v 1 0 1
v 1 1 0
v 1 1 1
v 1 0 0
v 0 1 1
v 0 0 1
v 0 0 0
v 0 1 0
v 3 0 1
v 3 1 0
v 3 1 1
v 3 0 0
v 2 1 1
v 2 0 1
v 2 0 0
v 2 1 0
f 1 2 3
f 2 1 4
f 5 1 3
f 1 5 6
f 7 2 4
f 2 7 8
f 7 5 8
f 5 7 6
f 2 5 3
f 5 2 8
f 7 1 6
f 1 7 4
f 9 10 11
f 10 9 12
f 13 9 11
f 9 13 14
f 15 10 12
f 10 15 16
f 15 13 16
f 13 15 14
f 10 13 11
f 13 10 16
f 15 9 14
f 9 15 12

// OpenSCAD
//type of the payload
shape = "cube";//[cube,sphere,torus]
//quantity of the payloads
quantity = 2;
//distance between the payloads on the printbed
distance = 1;
/*[sphere]*/
// radius of your sphere in mm
radius = 1;
// sides of your sphere in mm
sides_of_sphere = 50;//[3:100]
/*[cube]*/
//width of your cube in mm
width = 1;
//height of your cube in mm
height = 1;
//length of your cube in mm
length2 = 1;
/*[torus]*/
// radius of your torus in mm
torus_radius = 3;
// radius of your torus  thickness in mm
torus_thickness_radius = 1;
// sides of the torus
torus_sides = 8;
// faces of the torus
torus_faces = 16;
/*[Hidden]*/
for (i = [1 : abs(1) : quantity]) {
  if (shape == "sphere") {
    translate([((i - 1) + (i - 1) * distance), 0, 0]){
      {
        $fn=sides_of_sphere;    //set sides to sides_of_sphere
        sphere(r=radius);
      }
    }
  } else if (shape == "torus") {
    translate([((i - 1) + (i - 1) * distance), 0, 0]){
      // torus
      rotate_extrude($fn=torus_sides) {
        translate([torus_radius, 0, 0]) {
          circle(r=torus_thickness_radius, $fn=torus_faces);
        }
      }
    }
  } else {
    translate([((i - 1) + (i - 1) * distance), 0, 0]){
      cube([width, length2, height], center=false);
    }
  }

}
